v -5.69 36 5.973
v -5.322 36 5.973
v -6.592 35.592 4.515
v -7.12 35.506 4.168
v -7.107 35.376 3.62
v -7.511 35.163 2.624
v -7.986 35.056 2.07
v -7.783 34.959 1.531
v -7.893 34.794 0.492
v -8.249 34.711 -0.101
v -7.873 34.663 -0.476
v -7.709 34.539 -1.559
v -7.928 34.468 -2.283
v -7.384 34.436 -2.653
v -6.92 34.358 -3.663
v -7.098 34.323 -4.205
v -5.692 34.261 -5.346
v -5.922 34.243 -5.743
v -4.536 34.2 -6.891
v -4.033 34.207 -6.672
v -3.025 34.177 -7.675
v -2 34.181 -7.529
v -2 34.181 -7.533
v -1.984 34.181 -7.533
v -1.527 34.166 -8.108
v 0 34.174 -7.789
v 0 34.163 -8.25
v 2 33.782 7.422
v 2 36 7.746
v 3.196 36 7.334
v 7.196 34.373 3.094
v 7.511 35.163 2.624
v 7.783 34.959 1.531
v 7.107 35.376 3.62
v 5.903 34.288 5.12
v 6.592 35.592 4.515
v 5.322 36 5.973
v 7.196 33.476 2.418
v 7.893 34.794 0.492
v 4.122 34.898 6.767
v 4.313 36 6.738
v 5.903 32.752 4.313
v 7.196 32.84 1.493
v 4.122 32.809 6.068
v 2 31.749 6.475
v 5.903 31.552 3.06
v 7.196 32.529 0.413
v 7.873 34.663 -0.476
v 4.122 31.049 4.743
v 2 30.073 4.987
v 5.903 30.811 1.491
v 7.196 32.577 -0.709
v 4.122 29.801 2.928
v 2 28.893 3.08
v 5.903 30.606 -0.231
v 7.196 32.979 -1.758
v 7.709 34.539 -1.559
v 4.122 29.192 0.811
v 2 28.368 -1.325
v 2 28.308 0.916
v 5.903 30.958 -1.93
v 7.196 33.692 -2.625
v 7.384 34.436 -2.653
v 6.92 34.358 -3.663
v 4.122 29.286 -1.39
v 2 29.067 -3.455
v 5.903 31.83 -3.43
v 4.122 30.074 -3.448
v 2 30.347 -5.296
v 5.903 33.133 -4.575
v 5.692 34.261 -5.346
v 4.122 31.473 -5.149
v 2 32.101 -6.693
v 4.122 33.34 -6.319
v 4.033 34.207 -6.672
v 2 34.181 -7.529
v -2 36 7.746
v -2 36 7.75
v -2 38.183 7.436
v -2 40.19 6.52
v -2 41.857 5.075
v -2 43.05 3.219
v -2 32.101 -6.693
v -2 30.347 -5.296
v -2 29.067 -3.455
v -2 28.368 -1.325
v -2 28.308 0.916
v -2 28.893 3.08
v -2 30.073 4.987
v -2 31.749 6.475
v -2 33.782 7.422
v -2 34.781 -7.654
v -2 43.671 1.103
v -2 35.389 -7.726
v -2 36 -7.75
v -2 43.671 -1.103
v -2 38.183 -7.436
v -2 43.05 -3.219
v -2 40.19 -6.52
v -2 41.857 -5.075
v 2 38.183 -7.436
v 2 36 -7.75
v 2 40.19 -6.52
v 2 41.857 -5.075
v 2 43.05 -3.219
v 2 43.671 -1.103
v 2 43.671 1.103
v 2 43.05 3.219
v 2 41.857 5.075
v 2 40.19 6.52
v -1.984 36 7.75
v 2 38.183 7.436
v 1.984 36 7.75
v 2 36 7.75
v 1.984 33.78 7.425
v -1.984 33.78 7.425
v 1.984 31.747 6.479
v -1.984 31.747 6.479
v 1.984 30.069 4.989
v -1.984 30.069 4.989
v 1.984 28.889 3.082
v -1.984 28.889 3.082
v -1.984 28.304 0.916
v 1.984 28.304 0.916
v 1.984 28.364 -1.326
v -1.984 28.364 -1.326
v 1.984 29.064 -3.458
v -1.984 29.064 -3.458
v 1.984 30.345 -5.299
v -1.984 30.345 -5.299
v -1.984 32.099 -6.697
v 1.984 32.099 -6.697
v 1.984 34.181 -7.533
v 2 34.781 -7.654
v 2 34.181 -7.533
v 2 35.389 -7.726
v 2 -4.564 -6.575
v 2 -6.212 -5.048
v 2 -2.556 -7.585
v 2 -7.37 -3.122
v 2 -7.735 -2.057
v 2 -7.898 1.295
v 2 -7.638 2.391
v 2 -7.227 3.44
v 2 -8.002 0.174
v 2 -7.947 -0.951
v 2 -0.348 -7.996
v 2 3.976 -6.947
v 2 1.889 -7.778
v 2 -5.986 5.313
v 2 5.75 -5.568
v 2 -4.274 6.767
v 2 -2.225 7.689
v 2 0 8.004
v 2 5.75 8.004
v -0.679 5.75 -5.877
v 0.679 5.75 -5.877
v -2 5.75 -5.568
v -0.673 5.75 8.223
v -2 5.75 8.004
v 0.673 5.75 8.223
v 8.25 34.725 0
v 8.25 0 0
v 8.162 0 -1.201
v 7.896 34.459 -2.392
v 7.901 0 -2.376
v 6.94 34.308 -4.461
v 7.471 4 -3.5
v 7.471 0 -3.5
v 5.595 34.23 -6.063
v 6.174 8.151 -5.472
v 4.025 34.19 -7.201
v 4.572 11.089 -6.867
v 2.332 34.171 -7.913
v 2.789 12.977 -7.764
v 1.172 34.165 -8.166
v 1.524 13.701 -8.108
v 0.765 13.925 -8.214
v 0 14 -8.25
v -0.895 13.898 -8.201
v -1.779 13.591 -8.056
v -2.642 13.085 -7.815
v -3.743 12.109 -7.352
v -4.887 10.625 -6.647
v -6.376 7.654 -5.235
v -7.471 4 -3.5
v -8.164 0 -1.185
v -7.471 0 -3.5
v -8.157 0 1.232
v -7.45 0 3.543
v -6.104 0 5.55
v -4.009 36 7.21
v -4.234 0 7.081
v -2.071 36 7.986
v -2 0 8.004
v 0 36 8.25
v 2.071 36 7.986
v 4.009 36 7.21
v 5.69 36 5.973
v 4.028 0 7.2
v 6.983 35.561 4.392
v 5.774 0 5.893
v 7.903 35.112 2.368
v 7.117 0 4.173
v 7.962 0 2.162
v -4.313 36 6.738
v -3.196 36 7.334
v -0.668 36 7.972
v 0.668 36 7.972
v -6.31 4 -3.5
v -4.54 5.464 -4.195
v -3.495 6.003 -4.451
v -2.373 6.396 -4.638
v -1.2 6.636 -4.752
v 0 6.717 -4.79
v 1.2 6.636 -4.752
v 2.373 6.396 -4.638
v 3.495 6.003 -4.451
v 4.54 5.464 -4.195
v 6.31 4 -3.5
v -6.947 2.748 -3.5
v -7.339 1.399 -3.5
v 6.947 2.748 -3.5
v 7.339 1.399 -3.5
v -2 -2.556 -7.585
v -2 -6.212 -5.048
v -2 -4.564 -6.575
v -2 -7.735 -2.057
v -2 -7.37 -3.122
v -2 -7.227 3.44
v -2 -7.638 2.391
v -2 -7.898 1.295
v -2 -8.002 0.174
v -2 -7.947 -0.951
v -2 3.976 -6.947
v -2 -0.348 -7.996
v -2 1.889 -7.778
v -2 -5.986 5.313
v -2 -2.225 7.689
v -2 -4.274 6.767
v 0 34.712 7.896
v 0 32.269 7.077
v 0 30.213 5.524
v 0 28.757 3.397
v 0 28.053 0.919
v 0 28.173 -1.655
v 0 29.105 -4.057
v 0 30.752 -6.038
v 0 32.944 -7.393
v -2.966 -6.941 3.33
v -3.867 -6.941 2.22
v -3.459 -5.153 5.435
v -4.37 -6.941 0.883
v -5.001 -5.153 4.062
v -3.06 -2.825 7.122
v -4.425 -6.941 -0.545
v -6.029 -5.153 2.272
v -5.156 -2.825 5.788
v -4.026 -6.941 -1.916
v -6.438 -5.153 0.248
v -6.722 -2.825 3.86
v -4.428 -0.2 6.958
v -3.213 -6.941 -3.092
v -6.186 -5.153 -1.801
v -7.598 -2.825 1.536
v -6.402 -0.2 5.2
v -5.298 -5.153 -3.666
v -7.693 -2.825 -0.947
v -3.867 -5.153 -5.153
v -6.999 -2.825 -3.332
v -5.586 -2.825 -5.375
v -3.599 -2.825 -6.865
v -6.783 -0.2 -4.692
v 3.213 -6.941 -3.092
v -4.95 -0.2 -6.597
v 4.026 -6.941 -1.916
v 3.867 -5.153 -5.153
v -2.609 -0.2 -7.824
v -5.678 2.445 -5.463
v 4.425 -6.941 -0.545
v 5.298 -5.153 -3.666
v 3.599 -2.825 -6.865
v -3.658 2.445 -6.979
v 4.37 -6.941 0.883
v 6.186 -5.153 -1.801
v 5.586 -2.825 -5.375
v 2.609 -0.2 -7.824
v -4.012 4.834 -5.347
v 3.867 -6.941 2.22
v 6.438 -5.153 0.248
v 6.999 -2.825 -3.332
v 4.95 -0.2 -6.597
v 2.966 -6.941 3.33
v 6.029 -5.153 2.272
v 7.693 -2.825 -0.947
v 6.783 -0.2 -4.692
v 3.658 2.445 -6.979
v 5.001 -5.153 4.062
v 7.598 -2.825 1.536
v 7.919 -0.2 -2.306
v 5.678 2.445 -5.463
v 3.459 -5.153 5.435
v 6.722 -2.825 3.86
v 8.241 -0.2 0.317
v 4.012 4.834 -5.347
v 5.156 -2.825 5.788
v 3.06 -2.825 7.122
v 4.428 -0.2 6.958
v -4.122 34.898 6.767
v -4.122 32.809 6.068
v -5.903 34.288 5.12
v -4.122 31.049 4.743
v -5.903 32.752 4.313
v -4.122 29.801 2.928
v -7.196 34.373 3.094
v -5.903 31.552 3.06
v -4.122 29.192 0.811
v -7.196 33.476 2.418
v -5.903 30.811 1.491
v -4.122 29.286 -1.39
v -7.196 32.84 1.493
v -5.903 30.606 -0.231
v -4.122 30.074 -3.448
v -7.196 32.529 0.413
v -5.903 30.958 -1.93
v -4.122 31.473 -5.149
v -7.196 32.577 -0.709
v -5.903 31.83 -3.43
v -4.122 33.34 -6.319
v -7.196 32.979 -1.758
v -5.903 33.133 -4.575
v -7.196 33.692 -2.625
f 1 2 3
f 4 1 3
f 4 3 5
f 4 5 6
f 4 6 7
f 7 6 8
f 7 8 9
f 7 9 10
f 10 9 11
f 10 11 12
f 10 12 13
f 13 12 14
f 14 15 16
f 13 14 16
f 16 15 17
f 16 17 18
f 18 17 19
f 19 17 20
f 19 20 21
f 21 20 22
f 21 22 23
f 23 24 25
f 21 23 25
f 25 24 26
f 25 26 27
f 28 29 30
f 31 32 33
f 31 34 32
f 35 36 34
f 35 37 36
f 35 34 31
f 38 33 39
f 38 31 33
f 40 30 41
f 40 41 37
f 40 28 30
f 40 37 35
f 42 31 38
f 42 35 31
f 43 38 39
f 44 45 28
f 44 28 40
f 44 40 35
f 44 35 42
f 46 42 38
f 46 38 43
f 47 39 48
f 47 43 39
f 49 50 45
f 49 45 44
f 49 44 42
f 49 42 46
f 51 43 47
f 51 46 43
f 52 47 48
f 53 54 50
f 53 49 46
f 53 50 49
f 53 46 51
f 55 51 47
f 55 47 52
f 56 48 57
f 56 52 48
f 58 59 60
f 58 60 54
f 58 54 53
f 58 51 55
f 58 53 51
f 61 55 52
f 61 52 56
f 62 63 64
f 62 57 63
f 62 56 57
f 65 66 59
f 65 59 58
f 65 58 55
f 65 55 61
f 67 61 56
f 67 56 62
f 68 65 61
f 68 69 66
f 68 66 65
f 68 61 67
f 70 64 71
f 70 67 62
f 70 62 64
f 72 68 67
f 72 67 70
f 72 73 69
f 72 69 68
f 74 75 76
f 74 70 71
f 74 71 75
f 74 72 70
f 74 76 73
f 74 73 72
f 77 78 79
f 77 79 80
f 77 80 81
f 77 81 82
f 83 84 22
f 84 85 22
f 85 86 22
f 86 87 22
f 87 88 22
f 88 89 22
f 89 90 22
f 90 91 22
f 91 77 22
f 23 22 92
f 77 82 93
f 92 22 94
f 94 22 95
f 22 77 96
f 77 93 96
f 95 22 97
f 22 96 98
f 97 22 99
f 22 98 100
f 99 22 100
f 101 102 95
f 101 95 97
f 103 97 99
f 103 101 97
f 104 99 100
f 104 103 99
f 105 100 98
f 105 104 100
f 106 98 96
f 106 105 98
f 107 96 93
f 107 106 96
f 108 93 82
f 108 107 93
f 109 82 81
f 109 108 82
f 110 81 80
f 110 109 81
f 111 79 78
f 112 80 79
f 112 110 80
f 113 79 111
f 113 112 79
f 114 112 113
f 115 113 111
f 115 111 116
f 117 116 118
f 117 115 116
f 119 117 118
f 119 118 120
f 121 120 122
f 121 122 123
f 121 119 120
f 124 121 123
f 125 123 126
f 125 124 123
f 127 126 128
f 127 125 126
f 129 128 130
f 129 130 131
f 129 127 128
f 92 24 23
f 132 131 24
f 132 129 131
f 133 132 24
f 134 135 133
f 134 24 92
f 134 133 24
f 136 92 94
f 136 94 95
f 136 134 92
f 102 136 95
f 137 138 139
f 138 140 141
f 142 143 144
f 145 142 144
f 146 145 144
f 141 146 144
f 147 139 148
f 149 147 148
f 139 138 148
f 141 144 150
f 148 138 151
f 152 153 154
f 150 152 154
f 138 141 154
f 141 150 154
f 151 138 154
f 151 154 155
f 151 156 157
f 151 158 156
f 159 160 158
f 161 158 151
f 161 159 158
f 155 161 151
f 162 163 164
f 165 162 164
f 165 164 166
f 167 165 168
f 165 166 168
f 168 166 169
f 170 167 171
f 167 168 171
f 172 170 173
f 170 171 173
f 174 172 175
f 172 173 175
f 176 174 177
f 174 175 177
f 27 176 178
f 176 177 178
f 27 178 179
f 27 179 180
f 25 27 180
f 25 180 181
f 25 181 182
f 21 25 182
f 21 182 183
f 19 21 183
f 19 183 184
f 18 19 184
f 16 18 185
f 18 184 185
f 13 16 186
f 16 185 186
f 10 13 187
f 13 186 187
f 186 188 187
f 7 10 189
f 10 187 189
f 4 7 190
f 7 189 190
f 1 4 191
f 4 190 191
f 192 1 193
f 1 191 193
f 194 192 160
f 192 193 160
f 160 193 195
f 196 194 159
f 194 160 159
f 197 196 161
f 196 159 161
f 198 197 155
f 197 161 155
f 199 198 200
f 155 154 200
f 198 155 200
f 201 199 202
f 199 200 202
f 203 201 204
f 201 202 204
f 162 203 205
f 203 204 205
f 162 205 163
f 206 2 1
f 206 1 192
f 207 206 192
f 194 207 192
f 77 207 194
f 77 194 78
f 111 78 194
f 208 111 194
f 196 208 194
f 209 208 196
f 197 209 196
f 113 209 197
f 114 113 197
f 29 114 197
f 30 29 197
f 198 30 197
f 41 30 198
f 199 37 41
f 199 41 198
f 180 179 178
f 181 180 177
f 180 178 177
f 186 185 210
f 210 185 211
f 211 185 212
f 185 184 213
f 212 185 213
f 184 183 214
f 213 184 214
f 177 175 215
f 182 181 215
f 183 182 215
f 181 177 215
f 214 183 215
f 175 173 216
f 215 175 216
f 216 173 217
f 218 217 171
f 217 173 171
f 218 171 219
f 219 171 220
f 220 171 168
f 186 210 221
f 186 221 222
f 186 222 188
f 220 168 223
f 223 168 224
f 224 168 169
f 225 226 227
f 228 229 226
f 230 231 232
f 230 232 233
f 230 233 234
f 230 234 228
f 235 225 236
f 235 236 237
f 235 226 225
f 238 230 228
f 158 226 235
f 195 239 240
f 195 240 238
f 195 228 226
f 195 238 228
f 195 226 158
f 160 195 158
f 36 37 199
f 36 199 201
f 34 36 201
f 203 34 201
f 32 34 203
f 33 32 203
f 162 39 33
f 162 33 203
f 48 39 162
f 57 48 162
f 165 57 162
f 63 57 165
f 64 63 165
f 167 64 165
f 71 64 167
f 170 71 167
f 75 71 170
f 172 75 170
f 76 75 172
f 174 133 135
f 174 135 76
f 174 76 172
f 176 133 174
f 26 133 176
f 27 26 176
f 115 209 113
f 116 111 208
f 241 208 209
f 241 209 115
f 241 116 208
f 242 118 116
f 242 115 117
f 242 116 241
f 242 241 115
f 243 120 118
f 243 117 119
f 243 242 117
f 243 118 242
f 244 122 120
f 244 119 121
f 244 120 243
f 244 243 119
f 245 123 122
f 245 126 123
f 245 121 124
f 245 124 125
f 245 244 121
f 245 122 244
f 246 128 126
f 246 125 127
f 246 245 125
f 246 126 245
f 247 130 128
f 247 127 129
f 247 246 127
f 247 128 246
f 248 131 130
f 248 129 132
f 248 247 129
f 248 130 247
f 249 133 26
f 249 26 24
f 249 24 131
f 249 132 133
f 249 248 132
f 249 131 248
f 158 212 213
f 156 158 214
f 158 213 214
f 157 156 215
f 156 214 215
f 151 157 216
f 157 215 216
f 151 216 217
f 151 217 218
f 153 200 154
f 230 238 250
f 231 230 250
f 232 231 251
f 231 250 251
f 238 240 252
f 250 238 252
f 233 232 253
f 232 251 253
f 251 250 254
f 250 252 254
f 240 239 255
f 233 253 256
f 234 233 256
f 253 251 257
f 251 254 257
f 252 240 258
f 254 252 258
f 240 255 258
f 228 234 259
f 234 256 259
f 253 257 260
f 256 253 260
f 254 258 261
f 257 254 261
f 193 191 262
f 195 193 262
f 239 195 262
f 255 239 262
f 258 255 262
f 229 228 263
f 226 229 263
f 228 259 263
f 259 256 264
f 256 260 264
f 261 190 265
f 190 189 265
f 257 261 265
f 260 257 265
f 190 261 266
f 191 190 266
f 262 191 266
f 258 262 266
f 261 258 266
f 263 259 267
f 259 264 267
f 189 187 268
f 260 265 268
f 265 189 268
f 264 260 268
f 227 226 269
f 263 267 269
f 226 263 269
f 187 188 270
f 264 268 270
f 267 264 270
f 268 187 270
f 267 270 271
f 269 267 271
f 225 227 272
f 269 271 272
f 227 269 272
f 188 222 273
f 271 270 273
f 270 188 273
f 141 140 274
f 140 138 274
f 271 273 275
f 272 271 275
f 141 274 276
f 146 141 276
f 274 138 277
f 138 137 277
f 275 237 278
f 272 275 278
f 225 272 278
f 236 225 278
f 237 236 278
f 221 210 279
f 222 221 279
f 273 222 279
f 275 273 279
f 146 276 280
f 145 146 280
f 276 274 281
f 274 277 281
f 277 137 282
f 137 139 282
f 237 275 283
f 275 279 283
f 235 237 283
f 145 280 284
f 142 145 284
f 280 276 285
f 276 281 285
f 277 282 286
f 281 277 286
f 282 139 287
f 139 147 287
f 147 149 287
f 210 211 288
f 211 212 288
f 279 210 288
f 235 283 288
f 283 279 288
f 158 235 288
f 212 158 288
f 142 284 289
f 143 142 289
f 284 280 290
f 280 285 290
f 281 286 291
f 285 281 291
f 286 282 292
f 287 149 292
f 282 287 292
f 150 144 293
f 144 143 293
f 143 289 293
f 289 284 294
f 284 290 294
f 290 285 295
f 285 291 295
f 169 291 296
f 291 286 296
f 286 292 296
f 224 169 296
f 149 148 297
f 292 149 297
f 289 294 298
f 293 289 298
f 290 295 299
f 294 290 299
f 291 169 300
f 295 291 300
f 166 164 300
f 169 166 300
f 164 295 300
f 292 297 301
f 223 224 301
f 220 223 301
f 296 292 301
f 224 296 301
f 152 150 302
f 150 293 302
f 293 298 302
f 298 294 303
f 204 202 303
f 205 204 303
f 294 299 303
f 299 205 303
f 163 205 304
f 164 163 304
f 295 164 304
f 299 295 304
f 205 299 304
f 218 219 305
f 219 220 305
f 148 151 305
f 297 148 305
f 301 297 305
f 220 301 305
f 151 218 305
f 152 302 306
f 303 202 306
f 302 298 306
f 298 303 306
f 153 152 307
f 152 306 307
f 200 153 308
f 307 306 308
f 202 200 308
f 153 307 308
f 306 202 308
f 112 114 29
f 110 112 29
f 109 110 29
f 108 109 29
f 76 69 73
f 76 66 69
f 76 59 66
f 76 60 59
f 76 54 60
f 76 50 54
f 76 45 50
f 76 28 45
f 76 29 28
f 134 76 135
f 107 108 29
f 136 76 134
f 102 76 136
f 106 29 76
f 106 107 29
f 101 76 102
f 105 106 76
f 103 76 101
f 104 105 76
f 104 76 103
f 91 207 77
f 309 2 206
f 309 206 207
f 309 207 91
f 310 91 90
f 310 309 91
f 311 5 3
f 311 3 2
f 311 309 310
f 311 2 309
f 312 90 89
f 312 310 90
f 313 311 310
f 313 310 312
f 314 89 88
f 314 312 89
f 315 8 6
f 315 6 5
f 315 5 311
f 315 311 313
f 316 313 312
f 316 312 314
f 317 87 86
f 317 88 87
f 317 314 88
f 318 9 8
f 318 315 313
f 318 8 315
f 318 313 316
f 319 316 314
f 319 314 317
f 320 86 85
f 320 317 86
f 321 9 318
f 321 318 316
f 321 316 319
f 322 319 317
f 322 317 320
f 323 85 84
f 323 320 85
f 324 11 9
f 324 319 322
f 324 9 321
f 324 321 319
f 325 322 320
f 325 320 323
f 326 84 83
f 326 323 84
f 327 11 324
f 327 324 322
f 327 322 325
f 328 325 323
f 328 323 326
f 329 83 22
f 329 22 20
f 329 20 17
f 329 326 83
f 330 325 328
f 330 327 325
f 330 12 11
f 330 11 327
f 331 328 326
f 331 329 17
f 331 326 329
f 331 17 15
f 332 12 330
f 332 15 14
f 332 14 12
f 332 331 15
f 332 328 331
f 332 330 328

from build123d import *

# Parameters (mm, degrees)
CROQUIS1_R              = 8.25
SALIENTE_EXTRUIR1_DEPTH = 36
CORTAR_EXTRUIR5_DEPTH   = 18
CORTAR_EXTRUIR7_DEPTH   = 15
CROQUIS23_R             = 7.75
SALIENTE_EXTRUIR4_DEPTH = 2
CROQUIS25_W             = 4
CROQUIS25_H             = 14
CORTAR_EXTRUIR8_DEPTH   = 15


with BuildPart() as part:
    # Croquis1 → Saliente-Extruir1 (new body)
    with BuildSketch(Plane(origin=(0, 0, 0), x_dir=(1, 0, 0), z_dir=(0, 1, 0))):
        Circle(CROQUIS1_R)
    extrude(amount=SALIENTE_EXTRUIR1_DEPTH)

    # Croquis3 → Cortar-Extruir5 (cut, symmetric)
    with BuildSketch(Plane(origin=(0, 0, 0), x_dir=(0, 0, -1), z_dir=(1, 0, 0))):
        Polygon((8.25, 0), (8.25, 14), (3.5, 4), (3.5, 0), align=None)
    extrude(amount=CORTAR_EXTRUIR5_DEPTH, both=True, mode=Mode.SUBTRACT)

    # Croquis18 → Revolución1 (revolve)
    with BuildSketch(Plane(origin=(0, 0, 0), x_dir=(0, 0, -1), z_dir=(1, 0, 0))):
        with BuildLine():
            Line((0, 8.25), (0, -8.25))
            ThreePointArc((0, -8.25), (8.25, 0), (0, 8.25))
        make_face()
    revolve(axis=Axis((0, 8.25, 0), (0, -1, 0)))

    # Croquis20 → Cortar-Revolución1 (revolve, cut)
    with BuildSketch(Plane(origin=(0, 36, 0), x_dir=(1, 0, 0), z_dir=(0, 1, 0))):
        with BuildLine():
            Line((-8, 0), (8, 0))
            ThreePointArc((8, 0), (0, 8), (-8, 0))
        make_face()
    revolve(axis=Axis((-8, 36, 0), (1, 0, 0)), mode=Mode.SUBTRACT)

    # Croquis24 → Cortar-Extruir7 (cut, symmetric)
    with BuildSketch(Plane(origin=(0, 0, 0), x_dir=(0, 0, -1), z_dir=(1, 0, 0))):
        with BuildLine():
            Line((-5.973353696, 36), (8.25, 36))
            Line((8.25, 36), (8.25, 34.163037065))
            add(Edge.make_bspline(
                [(-5.973353696, 36), (-1.37807863, 34.604512728), (3.281869782, 34.274988011), (8.25, 34.163037065)],
                knots=[0, 0, 0, 0, 1, 1, 1, 1], degree=3))
        make_face()
    extrude(amount=CORTAR_EXTRUIR7_DEPTH, both=True, mode=Mode.SUBTRACT)

    # Croquis23 → Saliente-Extruir4 (add, symmetric)
    with BuildSketch(Plane(origin=(0, 0, 0), x_dir=(0, 0, -1), z_dir=(1, 0, 0))):
        with Locations((0, 36)):
            Circle(CROQUIS23_R)
    extrude(amount=SALIENTE_EXTRUIR4_DEPTH, both=True)

    # Croquis25 → Cortar-Extruir8 (cut, symmetric)
    with BuildSketch(Plane.XY):
        with Locations((0, -1.25)):
            Rectangle(CROQUIS25_W, CROQUIS25_H)
    extrude(amount=CORTAR_EXTRUIR8_DEPTH, both=True, mode=Mode.SUBTRACT)


solid = part.part
